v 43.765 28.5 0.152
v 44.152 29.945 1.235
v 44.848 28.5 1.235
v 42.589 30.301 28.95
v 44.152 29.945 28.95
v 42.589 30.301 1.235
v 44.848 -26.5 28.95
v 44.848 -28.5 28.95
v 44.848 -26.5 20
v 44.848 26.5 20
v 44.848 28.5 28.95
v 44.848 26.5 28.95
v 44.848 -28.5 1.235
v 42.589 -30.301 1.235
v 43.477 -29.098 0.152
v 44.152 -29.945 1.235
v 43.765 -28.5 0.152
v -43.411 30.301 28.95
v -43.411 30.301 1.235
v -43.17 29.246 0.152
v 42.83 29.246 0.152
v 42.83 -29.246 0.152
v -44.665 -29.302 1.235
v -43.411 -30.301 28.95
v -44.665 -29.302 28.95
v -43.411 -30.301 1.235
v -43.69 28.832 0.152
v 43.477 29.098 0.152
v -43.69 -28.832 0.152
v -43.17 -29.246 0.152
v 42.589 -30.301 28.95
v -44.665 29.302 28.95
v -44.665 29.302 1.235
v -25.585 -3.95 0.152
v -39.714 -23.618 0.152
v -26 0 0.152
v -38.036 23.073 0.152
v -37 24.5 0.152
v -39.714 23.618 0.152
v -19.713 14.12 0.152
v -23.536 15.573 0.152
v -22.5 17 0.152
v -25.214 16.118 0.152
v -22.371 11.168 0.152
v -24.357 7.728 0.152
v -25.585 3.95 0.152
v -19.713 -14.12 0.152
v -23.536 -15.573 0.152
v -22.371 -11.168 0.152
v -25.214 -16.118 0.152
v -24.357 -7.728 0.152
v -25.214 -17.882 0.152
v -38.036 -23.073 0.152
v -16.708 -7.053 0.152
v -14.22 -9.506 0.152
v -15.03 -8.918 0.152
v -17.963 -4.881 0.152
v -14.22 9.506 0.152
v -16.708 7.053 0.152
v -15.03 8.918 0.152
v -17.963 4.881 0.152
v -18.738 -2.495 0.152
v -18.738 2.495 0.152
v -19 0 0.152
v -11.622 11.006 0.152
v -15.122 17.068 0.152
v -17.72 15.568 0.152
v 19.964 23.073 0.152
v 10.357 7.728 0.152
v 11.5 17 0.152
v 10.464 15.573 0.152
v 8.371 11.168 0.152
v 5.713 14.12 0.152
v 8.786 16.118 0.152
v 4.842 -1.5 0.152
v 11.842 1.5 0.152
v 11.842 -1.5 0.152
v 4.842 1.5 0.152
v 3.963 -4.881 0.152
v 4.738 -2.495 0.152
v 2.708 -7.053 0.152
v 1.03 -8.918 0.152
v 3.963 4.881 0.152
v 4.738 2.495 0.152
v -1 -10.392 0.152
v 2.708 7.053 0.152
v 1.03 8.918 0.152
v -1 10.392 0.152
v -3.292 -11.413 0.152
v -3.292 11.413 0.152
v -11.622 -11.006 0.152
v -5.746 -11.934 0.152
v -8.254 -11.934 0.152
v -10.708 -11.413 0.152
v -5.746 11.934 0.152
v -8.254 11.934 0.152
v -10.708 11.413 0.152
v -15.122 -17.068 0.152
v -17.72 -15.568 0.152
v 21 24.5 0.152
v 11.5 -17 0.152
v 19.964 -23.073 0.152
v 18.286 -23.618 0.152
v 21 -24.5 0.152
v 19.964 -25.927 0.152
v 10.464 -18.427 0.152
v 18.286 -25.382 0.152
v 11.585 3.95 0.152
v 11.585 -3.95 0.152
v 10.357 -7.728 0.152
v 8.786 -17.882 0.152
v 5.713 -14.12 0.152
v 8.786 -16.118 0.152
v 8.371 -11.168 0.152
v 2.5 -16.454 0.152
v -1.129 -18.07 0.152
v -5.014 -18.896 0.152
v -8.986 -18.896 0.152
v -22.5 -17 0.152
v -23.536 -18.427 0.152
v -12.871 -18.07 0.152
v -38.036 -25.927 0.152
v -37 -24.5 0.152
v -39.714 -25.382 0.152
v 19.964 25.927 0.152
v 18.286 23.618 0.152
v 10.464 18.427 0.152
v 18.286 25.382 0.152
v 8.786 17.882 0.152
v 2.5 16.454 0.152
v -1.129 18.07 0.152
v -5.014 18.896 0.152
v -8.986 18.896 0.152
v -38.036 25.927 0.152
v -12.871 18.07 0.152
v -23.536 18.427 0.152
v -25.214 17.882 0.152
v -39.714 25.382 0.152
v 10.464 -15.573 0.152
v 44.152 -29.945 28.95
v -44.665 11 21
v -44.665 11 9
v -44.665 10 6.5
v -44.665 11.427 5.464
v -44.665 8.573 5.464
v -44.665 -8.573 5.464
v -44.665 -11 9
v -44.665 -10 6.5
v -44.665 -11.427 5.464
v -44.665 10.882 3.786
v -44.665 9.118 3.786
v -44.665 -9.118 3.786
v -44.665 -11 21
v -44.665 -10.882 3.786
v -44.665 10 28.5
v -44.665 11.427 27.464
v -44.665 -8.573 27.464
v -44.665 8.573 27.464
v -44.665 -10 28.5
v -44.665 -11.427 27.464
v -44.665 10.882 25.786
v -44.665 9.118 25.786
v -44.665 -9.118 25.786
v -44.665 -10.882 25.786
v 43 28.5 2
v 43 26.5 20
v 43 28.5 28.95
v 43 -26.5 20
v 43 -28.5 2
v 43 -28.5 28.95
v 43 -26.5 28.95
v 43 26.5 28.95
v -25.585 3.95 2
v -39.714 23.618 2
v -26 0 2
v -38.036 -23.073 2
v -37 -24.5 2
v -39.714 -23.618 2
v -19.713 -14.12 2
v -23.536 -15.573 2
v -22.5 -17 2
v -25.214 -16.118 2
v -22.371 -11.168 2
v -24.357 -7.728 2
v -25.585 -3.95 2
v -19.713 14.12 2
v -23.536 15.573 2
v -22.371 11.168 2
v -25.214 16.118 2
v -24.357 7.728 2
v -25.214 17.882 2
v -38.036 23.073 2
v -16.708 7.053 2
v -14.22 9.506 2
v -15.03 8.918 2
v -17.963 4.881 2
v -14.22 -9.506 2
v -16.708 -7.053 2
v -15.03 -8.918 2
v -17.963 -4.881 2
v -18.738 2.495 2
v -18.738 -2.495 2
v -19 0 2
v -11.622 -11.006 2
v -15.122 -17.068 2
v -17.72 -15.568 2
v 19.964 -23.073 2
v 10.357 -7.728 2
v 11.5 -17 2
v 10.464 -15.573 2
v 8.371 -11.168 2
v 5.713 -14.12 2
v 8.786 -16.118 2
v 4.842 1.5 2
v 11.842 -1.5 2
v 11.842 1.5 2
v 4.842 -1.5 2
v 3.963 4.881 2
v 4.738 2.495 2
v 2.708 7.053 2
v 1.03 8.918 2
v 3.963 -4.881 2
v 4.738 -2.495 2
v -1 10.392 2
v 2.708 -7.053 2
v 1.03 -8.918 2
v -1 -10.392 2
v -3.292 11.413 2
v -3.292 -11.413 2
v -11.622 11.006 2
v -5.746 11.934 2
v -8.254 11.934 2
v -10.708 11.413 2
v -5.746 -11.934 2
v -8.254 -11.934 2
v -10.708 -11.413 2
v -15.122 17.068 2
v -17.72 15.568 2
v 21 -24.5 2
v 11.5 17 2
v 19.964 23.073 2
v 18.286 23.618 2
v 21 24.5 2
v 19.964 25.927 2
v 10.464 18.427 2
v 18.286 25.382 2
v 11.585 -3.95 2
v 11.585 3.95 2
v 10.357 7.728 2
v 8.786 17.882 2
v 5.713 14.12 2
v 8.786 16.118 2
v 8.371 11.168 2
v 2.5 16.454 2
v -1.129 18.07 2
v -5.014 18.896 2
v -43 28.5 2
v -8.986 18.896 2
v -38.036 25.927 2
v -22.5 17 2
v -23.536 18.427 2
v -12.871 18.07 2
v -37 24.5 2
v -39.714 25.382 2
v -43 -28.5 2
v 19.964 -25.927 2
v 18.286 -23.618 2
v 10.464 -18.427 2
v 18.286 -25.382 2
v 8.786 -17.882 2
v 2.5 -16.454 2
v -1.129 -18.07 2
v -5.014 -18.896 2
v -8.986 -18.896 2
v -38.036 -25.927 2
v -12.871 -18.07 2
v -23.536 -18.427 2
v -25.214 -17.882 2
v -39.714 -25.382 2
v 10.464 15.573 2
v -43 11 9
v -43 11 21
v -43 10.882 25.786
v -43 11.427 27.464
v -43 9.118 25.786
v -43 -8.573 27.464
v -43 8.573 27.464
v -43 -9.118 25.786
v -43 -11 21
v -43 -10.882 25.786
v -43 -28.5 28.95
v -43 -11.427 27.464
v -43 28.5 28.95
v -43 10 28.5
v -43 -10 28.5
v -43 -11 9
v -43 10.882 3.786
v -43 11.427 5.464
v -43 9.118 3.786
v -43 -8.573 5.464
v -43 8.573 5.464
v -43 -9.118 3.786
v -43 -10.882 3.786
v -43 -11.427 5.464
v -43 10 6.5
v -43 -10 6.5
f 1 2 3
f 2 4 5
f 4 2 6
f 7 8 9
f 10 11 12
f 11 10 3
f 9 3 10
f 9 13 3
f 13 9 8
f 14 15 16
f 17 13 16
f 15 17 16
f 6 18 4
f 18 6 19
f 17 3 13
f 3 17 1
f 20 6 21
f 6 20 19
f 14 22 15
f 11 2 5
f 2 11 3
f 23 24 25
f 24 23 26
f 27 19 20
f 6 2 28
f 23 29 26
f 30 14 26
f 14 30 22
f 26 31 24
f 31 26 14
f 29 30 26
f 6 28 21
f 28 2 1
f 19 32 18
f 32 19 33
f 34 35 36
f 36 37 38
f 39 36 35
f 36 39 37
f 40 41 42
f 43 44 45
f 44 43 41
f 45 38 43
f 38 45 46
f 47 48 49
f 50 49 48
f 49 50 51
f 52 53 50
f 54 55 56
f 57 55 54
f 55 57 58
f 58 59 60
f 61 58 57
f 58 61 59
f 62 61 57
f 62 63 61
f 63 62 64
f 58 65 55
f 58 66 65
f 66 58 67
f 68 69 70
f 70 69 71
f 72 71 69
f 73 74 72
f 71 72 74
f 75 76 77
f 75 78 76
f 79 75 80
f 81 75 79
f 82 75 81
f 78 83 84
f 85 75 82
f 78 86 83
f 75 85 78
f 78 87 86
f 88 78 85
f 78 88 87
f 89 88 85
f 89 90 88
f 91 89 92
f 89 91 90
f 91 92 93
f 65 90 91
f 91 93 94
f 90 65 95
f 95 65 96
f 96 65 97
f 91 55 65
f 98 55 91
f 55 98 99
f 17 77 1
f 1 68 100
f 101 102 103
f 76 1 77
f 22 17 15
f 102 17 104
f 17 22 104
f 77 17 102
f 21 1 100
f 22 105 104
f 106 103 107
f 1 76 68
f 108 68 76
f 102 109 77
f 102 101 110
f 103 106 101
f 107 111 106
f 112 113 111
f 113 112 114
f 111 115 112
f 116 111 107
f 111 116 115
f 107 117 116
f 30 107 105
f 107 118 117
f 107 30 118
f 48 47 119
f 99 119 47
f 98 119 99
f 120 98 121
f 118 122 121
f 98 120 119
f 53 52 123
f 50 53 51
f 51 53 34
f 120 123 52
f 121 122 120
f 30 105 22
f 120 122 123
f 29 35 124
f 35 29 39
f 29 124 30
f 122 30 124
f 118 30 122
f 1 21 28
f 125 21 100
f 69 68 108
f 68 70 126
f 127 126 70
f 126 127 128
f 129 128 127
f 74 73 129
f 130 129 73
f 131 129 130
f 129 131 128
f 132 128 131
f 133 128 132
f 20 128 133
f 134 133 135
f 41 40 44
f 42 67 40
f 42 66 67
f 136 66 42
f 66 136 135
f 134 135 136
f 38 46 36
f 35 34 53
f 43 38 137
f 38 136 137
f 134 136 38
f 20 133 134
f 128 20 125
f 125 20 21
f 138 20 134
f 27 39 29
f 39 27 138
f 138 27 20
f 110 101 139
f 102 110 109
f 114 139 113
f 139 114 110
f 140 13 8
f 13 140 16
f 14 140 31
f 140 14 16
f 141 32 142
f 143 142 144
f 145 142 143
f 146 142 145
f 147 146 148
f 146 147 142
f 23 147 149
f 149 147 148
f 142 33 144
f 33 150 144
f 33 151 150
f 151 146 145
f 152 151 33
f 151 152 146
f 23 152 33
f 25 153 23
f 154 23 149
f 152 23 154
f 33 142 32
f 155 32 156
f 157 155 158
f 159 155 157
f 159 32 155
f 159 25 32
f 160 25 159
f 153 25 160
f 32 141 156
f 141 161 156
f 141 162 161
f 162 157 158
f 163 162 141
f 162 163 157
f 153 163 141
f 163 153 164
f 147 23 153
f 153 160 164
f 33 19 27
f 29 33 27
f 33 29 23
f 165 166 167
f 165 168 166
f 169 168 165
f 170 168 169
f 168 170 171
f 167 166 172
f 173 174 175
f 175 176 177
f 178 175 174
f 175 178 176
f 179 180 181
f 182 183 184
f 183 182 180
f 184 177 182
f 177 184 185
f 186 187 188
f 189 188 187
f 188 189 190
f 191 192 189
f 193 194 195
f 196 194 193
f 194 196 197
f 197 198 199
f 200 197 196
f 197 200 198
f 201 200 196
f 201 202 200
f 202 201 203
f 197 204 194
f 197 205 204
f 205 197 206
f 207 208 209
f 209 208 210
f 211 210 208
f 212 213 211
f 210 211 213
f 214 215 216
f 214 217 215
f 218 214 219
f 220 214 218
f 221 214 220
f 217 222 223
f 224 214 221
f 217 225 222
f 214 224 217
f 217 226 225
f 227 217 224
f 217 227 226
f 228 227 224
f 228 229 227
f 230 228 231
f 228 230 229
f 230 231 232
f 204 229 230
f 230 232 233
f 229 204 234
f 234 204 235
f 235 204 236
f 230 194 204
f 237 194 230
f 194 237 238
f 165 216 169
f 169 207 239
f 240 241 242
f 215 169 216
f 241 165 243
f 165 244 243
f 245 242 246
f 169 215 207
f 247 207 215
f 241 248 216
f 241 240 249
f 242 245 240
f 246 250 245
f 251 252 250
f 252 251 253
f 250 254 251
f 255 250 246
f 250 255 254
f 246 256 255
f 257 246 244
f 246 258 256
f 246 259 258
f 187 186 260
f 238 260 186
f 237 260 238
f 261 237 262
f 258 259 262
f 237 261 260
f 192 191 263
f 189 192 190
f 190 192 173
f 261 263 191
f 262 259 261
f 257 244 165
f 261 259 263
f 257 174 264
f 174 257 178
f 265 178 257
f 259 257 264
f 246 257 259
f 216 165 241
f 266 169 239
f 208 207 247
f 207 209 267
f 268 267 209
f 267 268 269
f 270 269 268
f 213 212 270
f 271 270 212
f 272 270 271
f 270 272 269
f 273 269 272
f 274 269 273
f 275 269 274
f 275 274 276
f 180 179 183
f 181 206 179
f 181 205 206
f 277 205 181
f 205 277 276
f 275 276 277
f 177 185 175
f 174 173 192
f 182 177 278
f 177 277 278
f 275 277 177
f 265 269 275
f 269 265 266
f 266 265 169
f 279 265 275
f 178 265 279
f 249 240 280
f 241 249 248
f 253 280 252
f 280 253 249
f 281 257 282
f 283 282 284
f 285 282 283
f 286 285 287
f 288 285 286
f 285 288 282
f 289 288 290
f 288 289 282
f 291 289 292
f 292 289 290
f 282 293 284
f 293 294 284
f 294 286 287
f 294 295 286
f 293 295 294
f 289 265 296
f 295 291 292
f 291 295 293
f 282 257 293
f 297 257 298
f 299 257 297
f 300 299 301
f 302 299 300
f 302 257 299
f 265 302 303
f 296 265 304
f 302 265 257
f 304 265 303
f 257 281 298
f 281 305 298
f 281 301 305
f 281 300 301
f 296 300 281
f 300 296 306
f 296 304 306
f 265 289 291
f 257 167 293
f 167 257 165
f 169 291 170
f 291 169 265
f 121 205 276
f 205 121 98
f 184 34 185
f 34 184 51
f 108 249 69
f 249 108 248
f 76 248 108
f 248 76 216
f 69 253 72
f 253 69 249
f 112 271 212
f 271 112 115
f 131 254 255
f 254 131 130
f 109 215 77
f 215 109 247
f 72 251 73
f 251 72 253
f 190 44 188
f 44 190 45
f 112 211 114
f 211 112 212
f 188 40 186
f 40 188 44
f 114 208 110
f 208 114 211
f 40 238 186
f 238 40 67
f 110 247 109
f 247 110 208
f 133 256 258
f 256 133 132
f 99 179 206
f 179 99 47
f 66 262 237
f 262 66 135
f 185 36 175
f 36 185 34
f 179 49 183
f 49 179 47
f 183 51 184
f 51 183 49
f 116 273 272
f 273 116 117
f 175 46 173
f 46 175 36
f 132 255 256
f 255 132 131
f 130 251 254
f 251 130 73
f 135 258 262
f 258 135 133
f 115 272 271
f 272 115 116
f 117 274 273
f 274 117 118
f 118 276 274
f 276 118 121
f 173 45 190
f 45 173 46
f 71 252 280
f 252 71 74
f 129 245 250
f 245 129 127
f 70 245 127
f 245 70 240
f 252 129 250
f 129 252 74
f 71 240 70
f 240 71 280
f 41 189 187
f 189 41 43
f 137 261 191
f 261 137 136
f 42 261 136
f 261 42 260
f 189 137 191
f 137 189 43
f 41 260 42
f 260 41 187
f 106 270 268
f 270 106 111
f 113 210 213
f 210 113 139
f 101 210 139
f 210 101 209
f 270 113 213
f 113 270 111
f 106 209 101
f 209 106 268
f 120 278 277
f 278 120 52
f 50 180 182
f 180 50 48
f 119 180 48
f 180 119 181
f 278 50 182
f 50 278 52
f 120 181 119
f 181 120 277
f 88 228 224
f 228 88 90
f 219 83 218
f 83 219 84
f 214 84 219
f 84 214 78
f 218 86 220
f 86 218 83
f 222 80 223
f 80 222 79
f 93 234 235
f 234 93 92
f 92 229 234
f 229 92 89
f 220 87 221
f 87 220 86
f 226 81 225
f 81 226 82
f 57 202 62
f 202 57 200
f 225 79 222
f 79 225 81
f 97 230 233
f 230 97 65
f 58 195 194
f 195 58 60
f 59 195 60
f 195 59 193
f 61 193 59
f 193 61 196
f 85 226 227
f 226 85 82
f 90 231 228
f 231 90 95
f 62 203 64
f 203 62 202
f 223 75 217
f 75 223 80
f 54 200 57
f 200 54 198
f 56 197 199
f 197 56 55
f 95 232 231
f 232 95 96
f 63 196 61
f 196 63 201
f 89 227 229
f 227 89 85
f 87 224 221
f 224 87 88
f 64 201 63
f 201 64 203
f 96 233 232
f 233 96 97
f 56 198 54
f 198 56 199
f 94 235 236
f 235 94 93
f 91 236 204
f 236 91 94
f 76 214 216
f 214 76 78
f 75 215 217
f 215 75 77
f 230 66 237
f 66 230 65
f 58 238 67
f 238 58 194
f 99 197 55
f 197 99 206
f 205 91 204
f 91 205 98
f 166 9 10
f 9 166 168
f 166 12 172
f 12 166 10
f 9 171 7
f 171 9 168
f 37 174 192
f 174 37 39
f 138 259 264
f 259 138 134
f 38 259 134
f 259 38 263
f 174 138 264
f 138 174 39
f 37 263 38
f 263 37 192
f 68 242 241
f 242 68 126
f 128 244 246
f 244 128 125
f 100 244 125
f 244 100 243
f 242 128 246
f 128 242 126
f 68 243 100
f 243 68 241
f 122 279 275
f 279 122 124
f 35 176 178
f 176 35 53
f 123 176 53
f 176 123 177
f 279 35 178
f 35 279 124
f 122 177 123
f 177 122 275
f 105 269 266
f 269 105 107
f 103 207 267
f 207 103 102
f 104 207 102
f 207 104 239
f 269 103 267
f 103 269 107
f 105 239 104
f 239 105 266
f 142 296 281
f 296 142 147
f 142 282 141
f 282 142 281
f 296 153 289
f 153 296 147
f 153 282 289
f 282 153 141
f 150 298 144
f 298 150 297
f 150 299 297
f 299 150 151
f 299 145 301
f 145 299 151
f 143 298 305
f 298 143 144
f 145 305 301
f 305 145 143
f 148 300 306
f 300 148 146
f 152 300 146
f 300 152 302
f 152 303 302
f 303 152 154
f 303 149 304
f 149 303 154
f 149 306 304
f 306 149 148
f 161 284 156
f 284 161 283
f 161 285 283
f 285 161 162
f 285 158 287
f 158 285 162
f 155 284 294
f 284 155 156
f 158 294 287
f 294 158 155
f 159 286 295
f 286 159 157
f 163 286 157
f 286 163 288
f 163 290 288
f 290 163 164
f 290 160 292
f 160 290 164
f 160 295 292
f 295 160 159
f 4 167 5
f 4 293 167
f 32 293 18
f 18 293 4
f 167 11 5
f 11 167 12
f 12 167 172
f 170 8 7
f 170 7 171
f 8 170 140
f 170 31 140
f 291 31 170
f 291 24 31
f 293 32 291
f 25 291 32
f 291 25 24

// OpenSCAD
// file: whole.scad
include <./common.scad>

module box_inner(){
    cube([box_length_inner, box_width_inner, box_height_inner], center = true);
}

module screen_screw_hole(){
translate([
    -box_length_outer/2-collision_spacer,
   0,
    box_height_inner])
rotate([0,90,0])
cylinder(h=box_border_size+collision_spacer*2,d=screen_screw_diameter);
}

module upper_vent_hole(){
translate([
            -box_length_inner/2+upper_vent_width/2+upper_vent_offset,
            0,
            box_height_inner+box_border_size-collision_spacer])
        difference(){
            union(){
                cylinder(d=upper_vent_diameter,h=box_border_size+collision_spacer*2,center=false );
                relative_hole_offset=upper_vent_width/2-upper_vent_hole_offset;
                translate([relative_hole_offset, relative_hole_offset, 0])
                cylinder(r=upper_vent_hole_radius,h=box_border_size+collision_spacer*2,center=false );
                translate([-relative_hole_offset, relative_hole_offset, 0])
                cylinder(r=upper_vent_hole_radius,h=box_border_size+collision_spacer*2,center=false );
                translate([relative_hole_offset,-relative_hole_offset, 0])
                cylinder(r=upper_vent_hole_radius,h=box_border_size+collision_spacer*2,center=false );
                translate([-relative_hole_offset, -relative_hole_offset, 0])
                cylinder(r=upper_vent_hole_radius,h=box_border_size+collision_spacer*2,center=false );
            }
            
            cylinder(d=upper_vent_inner_diameter,h=box_border_size+collision_spacer*2,center=false );
            
            translate([0,-upper_vent_bridge_width/2,0])
            cube([upper_vent_width/2,upper_vent_bridge_width,box_border_size+collision_spacer*2]);
            
            rotate([0,0,120])
            translate([0,-upper_vent_bridge_width/2,0])
            cube([upper_vent_width/2,upper_vent_bridge_width,box_border_size+collision_spacer*2]);
            
            rotate([0,0,240])
            translate([0,-upper_vent_bridge_width/2,0])
            cube([upper_vent_width/2,upper_vent_bridge_width,box_border_size+collision_spacer*2]);
        }
}

module box_whole(){
    difference(){
        translate([0,0,box_border_size + box_height_inner/2])
        difference(){
            minkowski(){
                box_inner();
                sphere(r=box_border_size);
            };
            
            // inner
            box_inner();
        }
        
        slot_depth = box_border_size+collision_spacer *2;
        
        // sd card slot
        
        translate([- box_length_outer/2,0,sdcard_slot_height/2 -collision_spacer])
        cylinder(h = sdcard_slot_height, r=sdcard_slot_radius, center= true);
        
        // usb and rj45
        translate([
            box_length_inner/2 + box_border_size/2 -collision_spacer, 
            0, 
            box_border_size + usb_height/2 + board_height+spacer_lower])
        cube([slot_depth,box_width_inner -4,usb_height],center=true);
        
        // audio jack
        translate([
            - box_length_inner/2+ minijack_offset,
            -box_width_outer/2 + box_border_size + collision_spacer,
            box_border_size+board_height+spacer_lower + minijack_diameter/2])
        rotate([90,0,0])
        union(){
            cylinder(d = minijack_diameter, h = slot_depth);
            translate([-minijack_diameter/2,0,0])
            cube([minijack_diameter,minijack_diameter/2,slot_depth],center=false);
        }
        
        // power usb
        translate([
            -box_length_inner/2+power_offset-power_width/2,
            -box_width_inner/2 - box_border_size + collision_spacer,
            box_border_size + spacer_lower + board_height])
        cube([power_width,slot_depth,power_height], center=false);
        
        // hdmi
        translate([
            -box_length_inner/2+hdmi_offset-hdmi_width/2,
            -box_width_inner/2 - box_border_size + collision_spacer,
            box_border_size + spacer_lower + board_height])
        cube([hdmi_width,slot_depth,hdmi_height], center=false);
        
        // bottom ventilation gaps
        low_vent_total_length = low_vent_rows * (low_vent_spread_y + low_vent_width);
        for(i=[0:low_vent_rows]){
            translate([low_vent_total_length/2 - low_vent_spread_x*i, low_vent_spread_y,0])
            cube([low_vent_width,low_vent_length,box_border_size+collision_spacer*2]);
            
            mirror([0,1,0])
            translate([low_vent_total_length/2 - low_vent_spread_x*i, low_vent_spread_y,0])
            cube([low_vent_width,low_vent_length,box_border_size+collision_spacer*2]);            
        }
        
        // screw holes bottom    
        translate([-box_length_inner/2+screw_offset_x_front,box_width_inner/2-screw_offset_y,-collision_spacer])
        cylinder(r=screw_radius,h=box_border_size+collision_spacer*2);
        
        translate([-box_length_inner/2+screw_offset_x_front + screw_distance_x,box_width_inner/2-screw_offset_y,-collision_spacer])
        cylinder(r=screw_radius,h=box_border_size+collision_spacer*2);
        
        translate([-box_length_inner/2+screw_offset_x_front,-box_width_inner/2+screw_offset_y,-collision_spacer])
        cylinder(r=screw_radius,h=box_border_size+collision_spacer*2);
        
        translate([-box_length_inner/2+screw_offset_x_front + screw_distance_x,-box_width_inner/2+screw_offset_y,-collision_spacer])
        cylinder(r=screw_radius,h=box_border_size+collision_spacer*2);
        
        // screw holes top    
        translate([-box_length_inner/2+screw_offset_x_front,box_width_inner/2-screw_offset_y,box_height_inner+box_border_size-collision_spacer])
        cylinder(r=screw_radius,h=box_border_size+collision_spacer*2);
        
        translate([-box_length_inner/2+screw_offset_x_front + screw_distance_x,box_width_inner/2-screw_offset_y,box_height_inner+box_border_size-collision_spacer])
        cylinder(r=screw_radius,h=box_border_size+collision_spacer*2);
        
        translate([-box_length_inner/2+screw_offset_x_front,-box_width_inner/2+screw_offset_y,box_height_inner+box_border_size-collision_spacer])
        cylinder(r=screw_radius,h=box_border_size+collision_spacer*2);
        
        translate([-box_length_inner/2+screw_offset_x_front + screw_distance_x,-box_width_inner/2+screw_offset_y,box_height_inner+box_border_size-collision_spacer])
        cylinder(r=screw_radius,h=box_border_size+collision_spacer*2);
        
        // screen
        screen_bottom_offset=box_height_inner-screen_inner_offset-screen_height;
        
        translate([-box_length_outer/2+collision_spacer+box_border_size,-screen_width/2,screen_bottom_offset])
        rotate([0,0,90])
        cube([screen_width,box_border_size+collision_spacer*2,screen_height]);
        
        // screen screw holes
        translate([0,screen_width/2-screen_screew_offset,-screen_screew_offset])
        screen_screw_hole();
        translate([0,-screen_width/2+screen_screew_offset,-screen_screew_offset])
        screen_screw_hole();
        translate([0,screen_width/2-screen_screew_offset,-screen_height_outer+screen_screw_diameter+screen_screew_offset])
        screen_screw_hole();
        translate([0,-screen_width/2+screen_screew_offset,-screen_height_outer+screen_screw_diameter+screen_screew_offset])
        screen_screw_hole();
        
        // upper vent
        upper_vent_hole();
    }
}


// view
box_whole();
// file: common.scad
// common

board_height = 1.5;

usb_height = 16;

screen_width=22;
screen_width_outer=24;
screen_height = 12;
screen_inner_offset=5;
screen_screw_diameter=3;
screen_screew_offset=1;
screen_height_outer=27;

minijack_diameter = 7;
minijack_offset = 54;

spacer_lower = 4;

box_length_inner = 86;
box_width_inner = 57;
box_height_inner = spacer_lower + board_height + minijack_diameter+screen_height_outer;

box_border_size = 2;

box_length_outer= box_length_inner + box_border_size*2;
box_width_outer = box_width_inner+ box_border_size*2;
box_height_outer = box_height_inner+ box_border_size*2;

sdcard_slot_height = 2.5 + spacer_lower + box_border_size;
sdcard_slot_radius= 8;
        
power_height= 7;
power_width = 10;
power_offset = 11;

hdmi_height = power_height;
hdmi_width = 20;
hdmi_offset= 33; 

low_vent_rows=14;
low_vent_length=15;
low_vent_width = 2;
low_vent_spread_x=4;
low_vent_spread_y=2;

screw_offset_y = 4;
screw_offset_x_front = 4.5;
screw_distance_x= 58;
screw_radius=1.5;

upper_vent_width=40;
upper_vent_diameter=38;
upper_vent_inner_diameter=24;
upper_vent_hole_radius=1.5;
upper_vent_hole_offset=3;
upper_vent_bridge_width=3;
upper_vent_offset=16;

collision_spacer = 0.1;
box_lower_height = box_border_size+ board_height+spacer_lower + minijack_diameter;
// main file
include <./common.scad>
use <./whole.scad>

module box_upper(){
    translate([0,0,box_height_outer])
    mirror([0,0,1])
    difference(){
        box_whole();
        
        translate([0,0,-box_height_outer/2 + box_lower_height])
        cube([
            box_length_outer+collision_spacer, 
            box_width_outer +collision_spacer,
            box_height_outer +collision_spacer
        ], center= true);
    }
}

box_upper();
